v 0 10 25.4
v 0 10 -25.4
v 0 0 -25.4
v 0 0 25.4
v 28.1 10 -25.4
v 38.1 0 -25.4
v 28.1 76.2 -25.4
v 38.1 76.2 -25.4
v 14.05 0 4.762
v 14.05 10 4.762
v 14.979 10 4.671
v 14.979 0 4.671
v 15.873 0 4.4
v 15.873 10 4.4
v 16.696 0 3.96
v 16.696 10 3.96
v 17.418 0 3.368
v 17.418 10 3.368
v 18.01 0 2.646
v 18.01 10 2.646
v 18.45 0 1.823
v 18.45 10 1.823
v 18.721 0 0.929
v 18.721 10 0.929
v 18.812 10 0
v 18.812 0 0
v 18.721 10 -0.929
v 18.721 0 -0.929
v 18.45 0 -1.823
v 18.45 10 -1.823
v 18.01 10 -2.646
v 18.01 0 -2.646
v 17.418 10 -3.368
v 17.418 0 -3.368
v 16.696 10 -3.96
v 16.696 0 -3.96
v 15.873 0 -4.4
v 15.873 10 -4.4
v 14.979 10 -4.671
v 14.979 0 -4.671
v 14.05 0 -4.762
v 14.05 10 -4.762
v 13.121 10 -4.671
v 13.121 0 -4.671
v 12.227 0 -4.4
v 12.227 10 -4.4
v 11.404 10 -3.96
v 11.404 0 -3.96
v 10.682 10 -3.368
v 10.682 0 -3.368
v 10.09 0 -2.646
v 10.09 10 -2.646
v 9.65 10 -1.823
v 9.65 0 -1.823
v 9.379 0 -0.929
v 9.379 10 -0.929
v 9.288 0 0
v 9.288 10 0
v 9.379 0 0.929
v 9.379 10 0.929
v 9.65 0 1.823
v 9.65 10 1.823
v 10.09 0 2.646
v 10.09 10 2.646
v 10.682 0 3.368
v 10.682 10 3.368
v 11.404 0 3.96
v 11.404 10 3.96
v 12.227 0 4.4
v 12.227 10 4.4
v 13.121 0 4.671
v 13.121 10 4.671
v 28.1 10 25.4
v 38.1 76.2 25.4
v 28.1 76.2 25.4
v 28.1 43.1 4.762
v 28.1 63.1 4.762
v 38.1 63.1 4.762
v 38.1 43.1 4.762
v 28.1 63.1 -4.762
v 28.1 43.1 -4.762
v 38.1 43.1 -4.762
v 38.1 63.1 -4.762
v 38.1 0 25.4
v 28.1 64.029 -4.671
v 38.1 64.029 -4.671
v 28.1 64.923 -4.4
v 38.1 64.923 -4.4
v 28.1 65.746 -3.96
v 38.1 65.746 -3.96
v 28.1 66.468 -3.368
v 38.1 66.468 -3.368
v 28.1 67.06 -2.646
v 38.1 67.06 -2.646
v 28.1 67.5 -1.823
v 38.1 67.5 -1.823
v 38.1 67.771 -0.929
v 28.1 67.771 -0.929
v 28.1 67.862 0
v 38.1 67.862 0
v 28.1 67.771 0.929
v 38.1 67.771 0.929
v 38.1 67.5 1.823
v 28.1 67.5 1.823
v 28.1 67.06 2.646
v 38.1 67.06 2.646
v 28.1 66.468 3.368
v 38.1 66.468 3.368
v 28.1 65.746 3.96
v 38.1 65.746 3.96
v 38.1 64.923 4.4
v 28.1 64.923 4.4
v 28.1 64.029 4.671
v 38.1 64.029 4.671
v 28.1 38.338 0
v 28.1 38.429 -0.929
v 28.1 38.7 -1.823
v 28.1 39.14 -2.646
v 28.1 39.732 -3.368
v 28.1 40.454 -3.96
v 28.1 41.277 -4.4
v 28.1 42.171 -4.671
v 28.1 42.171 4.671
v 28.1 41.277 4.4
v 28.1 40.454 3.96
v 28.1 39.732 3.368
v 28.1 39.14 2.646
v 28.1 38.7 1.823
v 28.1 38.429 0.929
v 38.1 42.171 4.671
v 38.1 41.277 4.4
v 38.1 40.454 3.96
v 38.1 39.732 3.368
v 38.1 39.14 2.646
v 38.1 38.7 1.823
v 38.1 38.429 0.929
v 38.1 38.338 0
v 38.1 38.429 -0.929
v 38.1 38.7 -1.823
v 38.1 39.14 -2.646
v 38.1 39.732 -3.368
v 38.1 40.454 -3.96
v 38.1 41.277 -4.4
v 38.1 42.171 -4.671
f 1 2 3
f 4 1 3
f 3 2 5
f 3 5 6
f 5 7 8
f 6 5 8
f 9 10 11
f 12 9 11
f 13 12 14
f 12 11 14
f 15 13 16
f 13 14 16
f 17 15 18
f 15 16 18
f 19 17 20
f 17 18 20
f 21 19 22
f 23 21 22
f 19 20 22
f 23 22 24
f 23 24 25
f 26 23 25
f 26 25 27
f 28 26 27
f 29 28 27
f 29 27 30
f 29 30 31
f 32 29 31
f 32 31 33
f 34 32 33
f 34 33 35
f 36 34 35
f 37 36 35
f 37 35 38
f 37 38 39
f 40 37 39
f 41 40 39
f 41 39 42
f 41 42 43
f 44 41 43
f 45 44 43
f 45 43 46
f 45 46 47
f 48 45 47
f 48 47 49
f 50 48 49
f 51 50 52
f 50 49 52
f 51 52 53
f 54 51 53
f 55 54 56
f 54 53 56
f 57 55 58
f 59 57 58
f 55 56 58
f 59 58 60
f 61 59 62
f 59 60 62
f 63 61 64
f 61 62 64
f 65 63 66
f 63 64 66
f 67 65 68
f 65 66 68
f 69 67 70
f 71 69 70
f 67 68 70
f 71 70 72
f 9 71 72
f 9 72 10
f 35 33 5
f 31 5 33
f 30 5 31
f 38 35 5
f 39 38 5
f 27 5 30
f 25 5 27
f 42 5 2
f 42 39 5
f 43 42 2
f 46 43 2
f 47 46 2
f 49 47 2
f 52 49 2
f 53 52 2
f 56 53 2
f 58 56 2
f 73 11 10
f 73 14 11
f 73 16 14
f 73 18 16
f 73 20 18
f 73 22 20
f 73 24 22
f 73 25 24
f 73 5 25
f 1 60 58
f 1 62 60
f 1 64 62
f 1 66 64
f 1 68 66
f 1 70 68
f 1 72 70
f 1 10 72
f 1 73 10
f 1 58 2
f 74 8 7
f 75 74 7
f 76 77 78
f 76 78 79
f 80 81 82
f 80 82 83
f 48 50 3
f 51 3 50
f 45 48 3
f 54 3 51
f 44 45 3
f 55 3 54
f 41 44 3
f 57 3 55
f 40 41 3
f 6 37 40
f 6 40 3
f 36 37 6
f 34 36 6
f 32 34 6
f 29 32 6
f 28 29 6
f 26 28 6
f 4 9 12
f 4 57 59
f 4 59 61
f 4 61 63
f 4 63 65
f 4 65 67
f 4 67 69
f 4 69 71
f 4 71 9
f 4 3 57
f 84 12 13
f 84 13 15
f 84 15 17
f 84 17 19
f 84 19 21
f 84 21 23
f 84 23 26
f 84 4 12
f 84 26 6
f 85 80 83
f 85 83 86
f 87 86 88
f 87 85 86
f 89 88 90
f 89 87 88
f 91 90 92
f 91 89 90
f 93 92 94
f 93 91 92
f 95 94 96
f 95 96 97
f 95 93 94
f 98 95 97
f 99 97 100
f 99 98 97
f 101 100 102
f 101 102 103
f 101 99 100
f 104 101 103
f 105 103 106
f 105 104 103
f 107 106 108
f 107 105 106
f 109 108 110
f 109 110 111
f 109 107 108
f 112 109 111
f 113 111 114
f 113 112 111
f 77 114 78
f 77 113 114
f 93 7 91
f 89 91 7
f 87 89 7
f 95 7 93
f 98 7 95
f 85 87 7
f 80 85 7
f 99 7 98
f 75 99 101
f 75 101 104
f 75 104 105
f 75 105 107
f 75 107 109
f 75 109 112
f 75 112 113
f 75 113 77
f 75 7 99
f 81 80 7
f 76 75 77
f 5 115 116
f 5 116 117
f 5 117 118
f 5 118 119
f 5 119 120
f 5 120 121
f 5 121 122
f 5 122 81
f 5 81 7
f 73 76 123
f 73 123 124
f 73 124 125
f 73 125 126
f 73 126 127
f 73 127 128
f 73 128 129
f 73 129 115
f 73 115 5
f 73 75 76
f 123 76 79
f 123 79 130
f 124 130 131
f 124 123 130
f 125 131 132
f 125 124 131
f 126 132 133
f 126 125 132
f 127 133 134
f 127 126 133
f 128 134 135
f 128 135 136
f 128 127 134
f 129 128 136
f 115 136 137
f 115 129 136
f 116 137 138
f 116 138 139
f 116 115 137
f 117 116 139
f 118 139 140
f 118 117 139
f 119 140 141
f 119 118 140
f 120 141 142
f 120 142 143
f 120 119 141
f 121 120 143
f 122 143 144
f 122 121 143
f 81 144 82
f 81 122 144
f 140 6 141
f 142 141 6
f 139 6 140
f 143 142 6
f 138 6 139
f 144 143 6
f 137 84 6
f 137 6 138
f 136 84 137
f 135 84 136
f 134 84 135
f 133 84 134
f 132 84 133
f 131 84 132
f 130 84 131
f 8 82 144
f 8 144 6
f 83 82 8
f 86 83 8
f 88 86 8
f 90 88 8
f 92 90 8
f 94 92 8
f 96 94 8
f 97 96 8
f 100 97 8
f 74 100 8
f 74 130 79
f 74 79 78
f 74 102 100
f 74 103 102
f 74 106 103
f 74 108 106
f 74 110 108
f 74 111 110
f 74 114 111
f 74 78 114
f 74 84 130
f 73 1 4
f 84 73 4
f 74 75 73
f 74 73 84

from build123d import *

# Parameters (mm, degrees)
EXTRUIR_L_MINA1_DEPTH = 25.4
CROQUIS2_R            = 4.7625
CORTAR_EXTRUIR1_DEPTH = 81.493540113
CORTAR_EXTRUIR2_DEPTH = 10


with BuildPart() as part:
    # Croquis1 → Extruir-Lámina1 (new, symmetric)
    with BuildSketch(Plane.XY):
        Polygon((0, 0), (38.1, 0), (38.1, 76.2), (28.1, 76.2), (28.1, 10), (0, 10), align=None)
    extrude(amount=EXTRUIR_L_MINA1_DEPTH, both=True)

    # Croquis2 → Cortar-Extruir1 (cut, through all)
    with BuildSketch(Plane(origin=(0, 10, 0), x_dir=(1, 0, 0), z_dir=(0, 1, 0))):
        with Locations(Location((14.05, 0, 0), (0, 0, 270))):
            Circle(CROQUIS2_R)
    extrude(amount=-CORTAR_EXTRUIR1_DEPTH, mode=Mode.SUBTRACT)

    # Croquis3 → Cortar-Extruir2 (cut)
    with BuildSketch(Plane.ZY.offset(-28.1)):
        with BuildLine():
            Line((-4.7625, 43.1), (-4.7625, 63.1))
            ThreePointArc((-4.7625, 63.1), (0, 67.8625), (4.7625, 63.1))
            Line((4.7625, 63.1), (4.7625, 43.1))
            ThreePointArc((4.7625, 43.1), (0, 38.3375), (-4.7625, 43.1))
        make_face()
    extrude(amount=-CORTAR_EXTRUIR2_DEPTH, mode=Mode.SUBTRACT)


solid = part.part
